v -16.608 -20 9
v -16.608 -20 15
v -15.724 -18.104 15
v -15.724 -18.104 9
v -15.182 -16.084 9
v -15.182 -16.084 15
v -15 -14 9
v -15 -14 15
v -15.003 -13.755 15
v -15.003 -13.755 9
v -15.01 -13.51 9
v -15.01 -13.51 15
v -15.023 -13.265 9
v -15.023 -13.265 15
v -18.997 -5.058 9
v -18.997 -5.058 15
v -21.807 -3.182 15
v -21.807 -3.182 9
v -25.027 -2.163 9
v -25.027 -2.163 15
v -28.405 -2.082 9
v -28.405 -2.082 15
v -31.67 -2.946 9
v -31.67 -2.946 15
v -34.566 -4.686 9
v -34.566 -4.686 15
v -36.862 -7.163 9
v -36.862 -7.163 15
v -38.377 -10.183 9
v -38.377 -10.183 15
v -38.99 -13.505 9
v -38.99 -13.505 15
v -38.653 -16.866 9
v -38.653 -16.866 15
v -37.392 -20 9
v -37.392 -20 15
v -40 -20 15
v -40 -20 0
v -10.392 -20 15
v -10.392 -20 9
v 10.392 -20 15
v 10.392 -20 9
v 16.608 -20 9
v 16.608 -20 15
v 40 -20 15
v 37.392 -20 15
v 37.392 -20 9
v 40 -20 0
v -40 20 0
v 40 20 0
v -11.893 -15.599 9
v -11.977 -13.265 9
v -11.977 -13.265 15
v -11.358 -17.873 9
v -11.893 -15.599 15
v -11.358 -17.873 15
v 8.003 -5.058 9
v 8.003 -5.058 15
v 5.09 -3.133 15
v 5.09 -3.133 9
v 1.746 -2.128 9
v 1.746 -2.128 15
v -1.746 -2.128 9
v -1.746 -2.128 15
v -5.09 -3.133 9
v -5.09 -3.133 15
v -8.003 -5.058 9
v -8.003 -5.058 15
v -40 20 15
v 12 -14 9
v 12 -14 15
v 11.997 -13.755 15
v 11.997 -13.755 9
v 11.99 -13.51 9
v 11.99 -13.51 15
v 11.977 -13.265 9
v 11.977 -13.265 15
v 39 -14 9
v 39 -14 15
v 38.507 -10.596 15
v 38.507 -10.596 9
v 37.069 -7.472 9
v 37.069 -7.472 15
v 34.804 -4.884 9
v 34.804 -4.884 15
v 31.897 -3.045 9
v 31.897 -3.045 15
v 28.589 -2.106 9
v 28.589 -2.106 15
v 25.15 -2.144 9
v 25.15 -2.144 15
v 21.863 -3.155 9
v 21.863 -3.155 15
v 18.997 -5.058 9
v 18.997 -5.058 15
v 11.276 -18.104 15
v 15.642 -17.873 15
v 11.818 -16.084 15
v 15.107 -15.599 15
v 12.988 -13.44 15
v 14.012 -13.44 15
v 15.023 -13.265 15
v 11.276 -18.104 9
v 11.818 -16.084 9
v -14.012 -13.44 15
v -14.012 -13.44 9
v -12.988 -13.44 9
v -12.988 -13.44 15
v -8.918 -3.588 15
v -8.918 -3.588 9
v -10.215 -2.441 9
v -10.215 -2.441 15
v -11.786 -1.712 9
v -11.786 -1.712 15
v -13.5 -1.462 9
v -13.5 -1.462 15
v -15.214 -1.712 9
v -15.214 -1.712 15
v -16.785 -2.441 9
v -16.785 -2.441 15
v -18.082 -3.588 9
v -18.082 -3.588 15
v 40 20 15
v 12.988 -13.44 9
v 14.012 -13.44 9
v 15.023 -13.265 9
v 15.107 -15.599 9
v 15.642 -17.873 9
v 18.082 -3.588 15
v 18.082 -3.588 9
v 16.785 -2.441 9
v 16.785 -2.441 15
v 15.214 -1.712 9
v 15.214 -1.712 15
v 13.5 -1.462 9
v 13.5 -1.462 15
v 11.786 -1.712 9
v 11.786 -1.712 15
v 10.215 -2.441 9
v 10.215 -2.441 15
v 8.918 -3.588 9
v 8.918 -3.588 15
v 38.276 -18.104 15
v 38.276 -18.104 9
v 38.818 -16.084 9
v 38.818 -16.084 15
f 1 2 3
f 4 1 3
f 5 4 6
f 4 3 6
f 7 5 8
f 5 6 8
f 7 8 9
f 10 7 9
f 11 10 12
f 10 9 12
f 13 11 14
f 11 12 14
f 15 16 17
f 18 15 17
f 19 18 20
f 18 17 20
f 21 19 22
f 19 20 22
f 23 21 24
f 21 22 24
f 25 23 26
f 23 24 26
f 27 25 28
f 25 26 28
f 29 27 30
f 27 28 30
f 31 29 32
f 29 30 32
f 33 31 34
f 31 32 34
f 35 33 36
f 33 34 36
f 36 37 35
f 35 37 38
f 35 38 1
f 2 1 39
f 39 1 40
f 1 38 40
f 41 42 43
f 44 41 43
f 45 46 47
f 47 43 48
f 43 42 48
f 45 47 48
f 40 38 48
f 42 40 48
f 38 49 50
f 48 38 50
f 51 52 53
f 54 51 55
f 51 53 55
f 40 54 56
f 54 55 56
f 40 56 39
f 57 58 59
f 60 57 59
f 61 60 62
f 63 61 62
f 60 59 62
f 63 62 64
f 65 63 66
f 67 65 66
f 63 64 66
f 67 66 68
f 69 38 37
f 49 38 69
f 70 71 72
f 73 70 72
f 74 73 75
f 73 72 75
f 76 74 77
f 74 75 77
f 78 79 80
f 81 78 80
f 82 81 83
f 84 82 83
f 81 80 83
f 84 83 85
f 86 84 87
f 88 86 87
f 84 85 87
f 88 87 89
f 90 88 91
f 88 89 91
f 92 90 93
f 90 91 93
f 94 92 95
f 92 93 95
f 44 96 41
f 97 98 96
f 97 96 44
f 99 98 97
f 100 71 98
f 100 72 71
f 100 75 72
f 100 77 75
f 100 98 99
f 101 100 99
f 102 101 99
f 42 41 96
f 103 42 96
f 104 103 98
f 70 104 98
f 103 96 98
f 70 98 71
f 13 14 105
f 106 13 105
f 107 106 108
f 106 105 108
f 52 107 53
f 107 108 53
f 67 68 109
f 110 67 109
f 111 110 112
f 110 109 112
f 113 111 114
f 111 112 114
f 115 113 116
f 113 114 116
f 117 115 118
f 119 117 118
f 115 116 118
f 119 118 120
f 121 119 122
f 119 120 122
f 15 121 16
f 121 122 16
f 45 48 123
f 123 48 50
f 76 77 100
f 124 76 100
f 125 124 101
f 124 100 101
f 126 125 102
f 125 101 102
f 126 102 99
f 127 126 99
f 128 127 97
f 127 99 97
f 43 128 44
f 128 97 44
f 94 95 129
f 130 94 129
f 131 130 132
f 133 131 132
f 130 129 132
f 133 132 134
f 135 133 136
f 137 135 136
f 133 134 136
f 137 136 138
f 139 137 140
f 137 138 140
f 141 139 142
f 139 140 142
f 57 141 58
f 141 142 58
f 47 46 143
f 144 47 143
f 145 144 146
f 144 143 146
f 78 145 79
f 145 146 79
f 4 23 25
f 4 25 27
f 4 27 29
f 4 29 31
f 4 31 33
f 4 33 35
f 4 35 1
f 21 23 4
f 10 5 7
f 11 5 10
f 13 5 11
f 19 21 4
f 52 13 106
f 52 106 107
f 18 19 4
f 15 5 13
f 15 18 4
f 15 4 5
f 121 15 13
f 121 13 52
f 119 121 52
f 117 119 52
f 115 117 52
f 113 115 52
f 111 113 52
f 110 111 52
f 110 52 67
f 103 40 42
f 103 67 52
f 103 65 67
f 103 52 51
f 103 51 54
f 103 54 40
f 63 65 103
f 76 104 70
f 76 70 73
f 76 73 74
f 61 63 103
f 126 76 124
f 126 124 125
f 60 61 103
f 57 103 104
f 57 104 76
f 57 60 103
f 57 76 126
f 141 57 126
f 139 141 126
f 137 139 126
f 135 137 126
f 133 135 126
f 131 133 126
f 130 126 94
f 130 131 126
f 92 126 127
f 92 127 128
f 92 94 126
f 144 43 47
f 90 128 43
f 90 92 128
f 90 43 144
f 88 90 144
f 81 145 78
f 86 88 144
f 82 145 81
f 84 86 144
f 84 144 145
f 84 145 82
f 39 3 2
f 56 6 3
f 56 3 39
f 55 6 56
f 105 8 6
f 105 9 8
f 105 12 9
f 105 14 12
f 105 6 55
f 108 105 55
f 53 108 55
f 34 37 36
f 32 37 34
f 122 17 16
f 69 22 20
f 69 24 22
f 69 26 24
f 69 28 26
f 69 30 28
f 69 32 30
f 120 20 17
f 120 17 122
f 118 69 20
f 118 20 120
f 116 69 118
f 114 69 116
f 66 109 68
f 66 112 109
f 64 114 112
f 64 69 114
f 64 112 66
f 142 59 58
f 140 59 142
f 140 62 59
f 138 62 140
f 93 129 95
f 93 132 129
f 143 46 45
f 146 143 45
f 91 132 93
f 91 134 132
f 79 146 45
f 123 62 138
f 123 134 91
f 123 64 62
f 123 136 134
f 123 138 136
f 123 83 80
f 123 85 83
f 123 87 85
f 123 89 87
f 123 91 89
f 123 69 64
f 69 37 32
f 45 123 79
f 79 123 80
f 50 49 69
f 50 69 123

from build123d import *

# Parameters (mm, degrees)
SKETCH1_W           = 80
SKETCH1_H           = 40
BOSS_EXTRUDE1_DEPTH = 15
SKETCH2_R           = 12
SKETCH2_R_2         = 6
CUT_EXTRUDE1_DEPTH  = 6


with BuildPart() as part:
    # Sketch1 → Boss-Extrude1 (new body)
    with BuildSketch(Plane.XY):
        Rectangle(SKETCH1_W, SKETCH1_H)
    extrude(amount=BOSS_EXTRUDE1_DEPTH)

    # Sketch2 → Cut-Extrude1 (cut)
    with BuildSketch(Plane.XY.offset(15)):
        with Locations((0, -14)):
            Circle(SKETCH2_R)
        with Locations((-13.5, -7.461651585)):
            Circle(SKETCH2_R_2)
        with Locations((-27, -14)):
            Circle(SKETCH2_R)
        with BuildLine():
            Line((-37.392304845, -20), (-16.607695155, -20))
            ThreePointArc((-16.607695155, -20), (-15.408890085, -17.105828541), (-15, -14))
            ThreePointArc((-15, -14), (-15.005629858, -13.632461014), (-15.022514151, -13.265266894))
            ThreePointArc((-15.022514151, -13.265266894), (-18.9, -10.076990951), (-18.997485849, -5.057977451))
            ThreePointArc((-18.997485849, -5.057977451), (-34.565962223, -4.685698327), (-37.392304845, -20))
        make_face()
        with BuildLine():
            ThreePointArc((10.392304845, -20), (11.591109915, -17.105828541), (12, -14))
            ThreePointArc((12, -14), (11.994370142, -13.632461014), (11.977485849, -13.265266894))
            ThreePointArc((11.977485849, -13.265266894), (8.1, -10.076990951), (8.002514151, -5.057977451))
            ThreePointArc((8.002514151, -5.057977451), (0, -2), (-8.002514151, -5.057977451))
            ThreePointArc((-8.002514151, -5.057977451), (-7.626972029, -6.233831381), (-7.5, -7.461651585))
            ThreePointArc((-7.5, -7.461651585), (-8.749469245, -11.12668331), (-11.977485849, -13.265266894))
            ThreePointArc((-11.977485849, -13.265266894), (-11.680797979, -16.749356028), (-10.392304845, -20))
            Line((-10.392304845, -20), (10.392304845, -20))
        make_face()
        with BuildLine():
            ThreePointArc((19.5, -7.461651585), (18.250530755, -11.12668331), (15.022514151, -13.265266894))
            ThreePointArc((15.022514151, -13.265266894), (15.319202021, -16.749356028), (16.607695155, -20))
            Line((16.607695155, -20), (37.392304845, -20))
            ThreePointArc((37.392304845, -20), (38.591109915, -17.105828541), (39, -14))
            ThreePointArc((39, -14), (31.897439647, -3.044860343), (18.997485849, -5.057977451))
            ThreePointArc((18.997485849, -5.057977451), (19.373027971, -6.233831381), (19.5, -7.461651585))
        make_face()
        with Locations((13.5, -7.461651585)):
            Circle(SKETCH2_R_2)
        with Locations((27, -14)):
            Circle(SKETCH2_R)
    extrude(amount=-CUT_EXTRUDE1_DEPTH, mode=Mode.SUBTRACT)


solid = part.part
